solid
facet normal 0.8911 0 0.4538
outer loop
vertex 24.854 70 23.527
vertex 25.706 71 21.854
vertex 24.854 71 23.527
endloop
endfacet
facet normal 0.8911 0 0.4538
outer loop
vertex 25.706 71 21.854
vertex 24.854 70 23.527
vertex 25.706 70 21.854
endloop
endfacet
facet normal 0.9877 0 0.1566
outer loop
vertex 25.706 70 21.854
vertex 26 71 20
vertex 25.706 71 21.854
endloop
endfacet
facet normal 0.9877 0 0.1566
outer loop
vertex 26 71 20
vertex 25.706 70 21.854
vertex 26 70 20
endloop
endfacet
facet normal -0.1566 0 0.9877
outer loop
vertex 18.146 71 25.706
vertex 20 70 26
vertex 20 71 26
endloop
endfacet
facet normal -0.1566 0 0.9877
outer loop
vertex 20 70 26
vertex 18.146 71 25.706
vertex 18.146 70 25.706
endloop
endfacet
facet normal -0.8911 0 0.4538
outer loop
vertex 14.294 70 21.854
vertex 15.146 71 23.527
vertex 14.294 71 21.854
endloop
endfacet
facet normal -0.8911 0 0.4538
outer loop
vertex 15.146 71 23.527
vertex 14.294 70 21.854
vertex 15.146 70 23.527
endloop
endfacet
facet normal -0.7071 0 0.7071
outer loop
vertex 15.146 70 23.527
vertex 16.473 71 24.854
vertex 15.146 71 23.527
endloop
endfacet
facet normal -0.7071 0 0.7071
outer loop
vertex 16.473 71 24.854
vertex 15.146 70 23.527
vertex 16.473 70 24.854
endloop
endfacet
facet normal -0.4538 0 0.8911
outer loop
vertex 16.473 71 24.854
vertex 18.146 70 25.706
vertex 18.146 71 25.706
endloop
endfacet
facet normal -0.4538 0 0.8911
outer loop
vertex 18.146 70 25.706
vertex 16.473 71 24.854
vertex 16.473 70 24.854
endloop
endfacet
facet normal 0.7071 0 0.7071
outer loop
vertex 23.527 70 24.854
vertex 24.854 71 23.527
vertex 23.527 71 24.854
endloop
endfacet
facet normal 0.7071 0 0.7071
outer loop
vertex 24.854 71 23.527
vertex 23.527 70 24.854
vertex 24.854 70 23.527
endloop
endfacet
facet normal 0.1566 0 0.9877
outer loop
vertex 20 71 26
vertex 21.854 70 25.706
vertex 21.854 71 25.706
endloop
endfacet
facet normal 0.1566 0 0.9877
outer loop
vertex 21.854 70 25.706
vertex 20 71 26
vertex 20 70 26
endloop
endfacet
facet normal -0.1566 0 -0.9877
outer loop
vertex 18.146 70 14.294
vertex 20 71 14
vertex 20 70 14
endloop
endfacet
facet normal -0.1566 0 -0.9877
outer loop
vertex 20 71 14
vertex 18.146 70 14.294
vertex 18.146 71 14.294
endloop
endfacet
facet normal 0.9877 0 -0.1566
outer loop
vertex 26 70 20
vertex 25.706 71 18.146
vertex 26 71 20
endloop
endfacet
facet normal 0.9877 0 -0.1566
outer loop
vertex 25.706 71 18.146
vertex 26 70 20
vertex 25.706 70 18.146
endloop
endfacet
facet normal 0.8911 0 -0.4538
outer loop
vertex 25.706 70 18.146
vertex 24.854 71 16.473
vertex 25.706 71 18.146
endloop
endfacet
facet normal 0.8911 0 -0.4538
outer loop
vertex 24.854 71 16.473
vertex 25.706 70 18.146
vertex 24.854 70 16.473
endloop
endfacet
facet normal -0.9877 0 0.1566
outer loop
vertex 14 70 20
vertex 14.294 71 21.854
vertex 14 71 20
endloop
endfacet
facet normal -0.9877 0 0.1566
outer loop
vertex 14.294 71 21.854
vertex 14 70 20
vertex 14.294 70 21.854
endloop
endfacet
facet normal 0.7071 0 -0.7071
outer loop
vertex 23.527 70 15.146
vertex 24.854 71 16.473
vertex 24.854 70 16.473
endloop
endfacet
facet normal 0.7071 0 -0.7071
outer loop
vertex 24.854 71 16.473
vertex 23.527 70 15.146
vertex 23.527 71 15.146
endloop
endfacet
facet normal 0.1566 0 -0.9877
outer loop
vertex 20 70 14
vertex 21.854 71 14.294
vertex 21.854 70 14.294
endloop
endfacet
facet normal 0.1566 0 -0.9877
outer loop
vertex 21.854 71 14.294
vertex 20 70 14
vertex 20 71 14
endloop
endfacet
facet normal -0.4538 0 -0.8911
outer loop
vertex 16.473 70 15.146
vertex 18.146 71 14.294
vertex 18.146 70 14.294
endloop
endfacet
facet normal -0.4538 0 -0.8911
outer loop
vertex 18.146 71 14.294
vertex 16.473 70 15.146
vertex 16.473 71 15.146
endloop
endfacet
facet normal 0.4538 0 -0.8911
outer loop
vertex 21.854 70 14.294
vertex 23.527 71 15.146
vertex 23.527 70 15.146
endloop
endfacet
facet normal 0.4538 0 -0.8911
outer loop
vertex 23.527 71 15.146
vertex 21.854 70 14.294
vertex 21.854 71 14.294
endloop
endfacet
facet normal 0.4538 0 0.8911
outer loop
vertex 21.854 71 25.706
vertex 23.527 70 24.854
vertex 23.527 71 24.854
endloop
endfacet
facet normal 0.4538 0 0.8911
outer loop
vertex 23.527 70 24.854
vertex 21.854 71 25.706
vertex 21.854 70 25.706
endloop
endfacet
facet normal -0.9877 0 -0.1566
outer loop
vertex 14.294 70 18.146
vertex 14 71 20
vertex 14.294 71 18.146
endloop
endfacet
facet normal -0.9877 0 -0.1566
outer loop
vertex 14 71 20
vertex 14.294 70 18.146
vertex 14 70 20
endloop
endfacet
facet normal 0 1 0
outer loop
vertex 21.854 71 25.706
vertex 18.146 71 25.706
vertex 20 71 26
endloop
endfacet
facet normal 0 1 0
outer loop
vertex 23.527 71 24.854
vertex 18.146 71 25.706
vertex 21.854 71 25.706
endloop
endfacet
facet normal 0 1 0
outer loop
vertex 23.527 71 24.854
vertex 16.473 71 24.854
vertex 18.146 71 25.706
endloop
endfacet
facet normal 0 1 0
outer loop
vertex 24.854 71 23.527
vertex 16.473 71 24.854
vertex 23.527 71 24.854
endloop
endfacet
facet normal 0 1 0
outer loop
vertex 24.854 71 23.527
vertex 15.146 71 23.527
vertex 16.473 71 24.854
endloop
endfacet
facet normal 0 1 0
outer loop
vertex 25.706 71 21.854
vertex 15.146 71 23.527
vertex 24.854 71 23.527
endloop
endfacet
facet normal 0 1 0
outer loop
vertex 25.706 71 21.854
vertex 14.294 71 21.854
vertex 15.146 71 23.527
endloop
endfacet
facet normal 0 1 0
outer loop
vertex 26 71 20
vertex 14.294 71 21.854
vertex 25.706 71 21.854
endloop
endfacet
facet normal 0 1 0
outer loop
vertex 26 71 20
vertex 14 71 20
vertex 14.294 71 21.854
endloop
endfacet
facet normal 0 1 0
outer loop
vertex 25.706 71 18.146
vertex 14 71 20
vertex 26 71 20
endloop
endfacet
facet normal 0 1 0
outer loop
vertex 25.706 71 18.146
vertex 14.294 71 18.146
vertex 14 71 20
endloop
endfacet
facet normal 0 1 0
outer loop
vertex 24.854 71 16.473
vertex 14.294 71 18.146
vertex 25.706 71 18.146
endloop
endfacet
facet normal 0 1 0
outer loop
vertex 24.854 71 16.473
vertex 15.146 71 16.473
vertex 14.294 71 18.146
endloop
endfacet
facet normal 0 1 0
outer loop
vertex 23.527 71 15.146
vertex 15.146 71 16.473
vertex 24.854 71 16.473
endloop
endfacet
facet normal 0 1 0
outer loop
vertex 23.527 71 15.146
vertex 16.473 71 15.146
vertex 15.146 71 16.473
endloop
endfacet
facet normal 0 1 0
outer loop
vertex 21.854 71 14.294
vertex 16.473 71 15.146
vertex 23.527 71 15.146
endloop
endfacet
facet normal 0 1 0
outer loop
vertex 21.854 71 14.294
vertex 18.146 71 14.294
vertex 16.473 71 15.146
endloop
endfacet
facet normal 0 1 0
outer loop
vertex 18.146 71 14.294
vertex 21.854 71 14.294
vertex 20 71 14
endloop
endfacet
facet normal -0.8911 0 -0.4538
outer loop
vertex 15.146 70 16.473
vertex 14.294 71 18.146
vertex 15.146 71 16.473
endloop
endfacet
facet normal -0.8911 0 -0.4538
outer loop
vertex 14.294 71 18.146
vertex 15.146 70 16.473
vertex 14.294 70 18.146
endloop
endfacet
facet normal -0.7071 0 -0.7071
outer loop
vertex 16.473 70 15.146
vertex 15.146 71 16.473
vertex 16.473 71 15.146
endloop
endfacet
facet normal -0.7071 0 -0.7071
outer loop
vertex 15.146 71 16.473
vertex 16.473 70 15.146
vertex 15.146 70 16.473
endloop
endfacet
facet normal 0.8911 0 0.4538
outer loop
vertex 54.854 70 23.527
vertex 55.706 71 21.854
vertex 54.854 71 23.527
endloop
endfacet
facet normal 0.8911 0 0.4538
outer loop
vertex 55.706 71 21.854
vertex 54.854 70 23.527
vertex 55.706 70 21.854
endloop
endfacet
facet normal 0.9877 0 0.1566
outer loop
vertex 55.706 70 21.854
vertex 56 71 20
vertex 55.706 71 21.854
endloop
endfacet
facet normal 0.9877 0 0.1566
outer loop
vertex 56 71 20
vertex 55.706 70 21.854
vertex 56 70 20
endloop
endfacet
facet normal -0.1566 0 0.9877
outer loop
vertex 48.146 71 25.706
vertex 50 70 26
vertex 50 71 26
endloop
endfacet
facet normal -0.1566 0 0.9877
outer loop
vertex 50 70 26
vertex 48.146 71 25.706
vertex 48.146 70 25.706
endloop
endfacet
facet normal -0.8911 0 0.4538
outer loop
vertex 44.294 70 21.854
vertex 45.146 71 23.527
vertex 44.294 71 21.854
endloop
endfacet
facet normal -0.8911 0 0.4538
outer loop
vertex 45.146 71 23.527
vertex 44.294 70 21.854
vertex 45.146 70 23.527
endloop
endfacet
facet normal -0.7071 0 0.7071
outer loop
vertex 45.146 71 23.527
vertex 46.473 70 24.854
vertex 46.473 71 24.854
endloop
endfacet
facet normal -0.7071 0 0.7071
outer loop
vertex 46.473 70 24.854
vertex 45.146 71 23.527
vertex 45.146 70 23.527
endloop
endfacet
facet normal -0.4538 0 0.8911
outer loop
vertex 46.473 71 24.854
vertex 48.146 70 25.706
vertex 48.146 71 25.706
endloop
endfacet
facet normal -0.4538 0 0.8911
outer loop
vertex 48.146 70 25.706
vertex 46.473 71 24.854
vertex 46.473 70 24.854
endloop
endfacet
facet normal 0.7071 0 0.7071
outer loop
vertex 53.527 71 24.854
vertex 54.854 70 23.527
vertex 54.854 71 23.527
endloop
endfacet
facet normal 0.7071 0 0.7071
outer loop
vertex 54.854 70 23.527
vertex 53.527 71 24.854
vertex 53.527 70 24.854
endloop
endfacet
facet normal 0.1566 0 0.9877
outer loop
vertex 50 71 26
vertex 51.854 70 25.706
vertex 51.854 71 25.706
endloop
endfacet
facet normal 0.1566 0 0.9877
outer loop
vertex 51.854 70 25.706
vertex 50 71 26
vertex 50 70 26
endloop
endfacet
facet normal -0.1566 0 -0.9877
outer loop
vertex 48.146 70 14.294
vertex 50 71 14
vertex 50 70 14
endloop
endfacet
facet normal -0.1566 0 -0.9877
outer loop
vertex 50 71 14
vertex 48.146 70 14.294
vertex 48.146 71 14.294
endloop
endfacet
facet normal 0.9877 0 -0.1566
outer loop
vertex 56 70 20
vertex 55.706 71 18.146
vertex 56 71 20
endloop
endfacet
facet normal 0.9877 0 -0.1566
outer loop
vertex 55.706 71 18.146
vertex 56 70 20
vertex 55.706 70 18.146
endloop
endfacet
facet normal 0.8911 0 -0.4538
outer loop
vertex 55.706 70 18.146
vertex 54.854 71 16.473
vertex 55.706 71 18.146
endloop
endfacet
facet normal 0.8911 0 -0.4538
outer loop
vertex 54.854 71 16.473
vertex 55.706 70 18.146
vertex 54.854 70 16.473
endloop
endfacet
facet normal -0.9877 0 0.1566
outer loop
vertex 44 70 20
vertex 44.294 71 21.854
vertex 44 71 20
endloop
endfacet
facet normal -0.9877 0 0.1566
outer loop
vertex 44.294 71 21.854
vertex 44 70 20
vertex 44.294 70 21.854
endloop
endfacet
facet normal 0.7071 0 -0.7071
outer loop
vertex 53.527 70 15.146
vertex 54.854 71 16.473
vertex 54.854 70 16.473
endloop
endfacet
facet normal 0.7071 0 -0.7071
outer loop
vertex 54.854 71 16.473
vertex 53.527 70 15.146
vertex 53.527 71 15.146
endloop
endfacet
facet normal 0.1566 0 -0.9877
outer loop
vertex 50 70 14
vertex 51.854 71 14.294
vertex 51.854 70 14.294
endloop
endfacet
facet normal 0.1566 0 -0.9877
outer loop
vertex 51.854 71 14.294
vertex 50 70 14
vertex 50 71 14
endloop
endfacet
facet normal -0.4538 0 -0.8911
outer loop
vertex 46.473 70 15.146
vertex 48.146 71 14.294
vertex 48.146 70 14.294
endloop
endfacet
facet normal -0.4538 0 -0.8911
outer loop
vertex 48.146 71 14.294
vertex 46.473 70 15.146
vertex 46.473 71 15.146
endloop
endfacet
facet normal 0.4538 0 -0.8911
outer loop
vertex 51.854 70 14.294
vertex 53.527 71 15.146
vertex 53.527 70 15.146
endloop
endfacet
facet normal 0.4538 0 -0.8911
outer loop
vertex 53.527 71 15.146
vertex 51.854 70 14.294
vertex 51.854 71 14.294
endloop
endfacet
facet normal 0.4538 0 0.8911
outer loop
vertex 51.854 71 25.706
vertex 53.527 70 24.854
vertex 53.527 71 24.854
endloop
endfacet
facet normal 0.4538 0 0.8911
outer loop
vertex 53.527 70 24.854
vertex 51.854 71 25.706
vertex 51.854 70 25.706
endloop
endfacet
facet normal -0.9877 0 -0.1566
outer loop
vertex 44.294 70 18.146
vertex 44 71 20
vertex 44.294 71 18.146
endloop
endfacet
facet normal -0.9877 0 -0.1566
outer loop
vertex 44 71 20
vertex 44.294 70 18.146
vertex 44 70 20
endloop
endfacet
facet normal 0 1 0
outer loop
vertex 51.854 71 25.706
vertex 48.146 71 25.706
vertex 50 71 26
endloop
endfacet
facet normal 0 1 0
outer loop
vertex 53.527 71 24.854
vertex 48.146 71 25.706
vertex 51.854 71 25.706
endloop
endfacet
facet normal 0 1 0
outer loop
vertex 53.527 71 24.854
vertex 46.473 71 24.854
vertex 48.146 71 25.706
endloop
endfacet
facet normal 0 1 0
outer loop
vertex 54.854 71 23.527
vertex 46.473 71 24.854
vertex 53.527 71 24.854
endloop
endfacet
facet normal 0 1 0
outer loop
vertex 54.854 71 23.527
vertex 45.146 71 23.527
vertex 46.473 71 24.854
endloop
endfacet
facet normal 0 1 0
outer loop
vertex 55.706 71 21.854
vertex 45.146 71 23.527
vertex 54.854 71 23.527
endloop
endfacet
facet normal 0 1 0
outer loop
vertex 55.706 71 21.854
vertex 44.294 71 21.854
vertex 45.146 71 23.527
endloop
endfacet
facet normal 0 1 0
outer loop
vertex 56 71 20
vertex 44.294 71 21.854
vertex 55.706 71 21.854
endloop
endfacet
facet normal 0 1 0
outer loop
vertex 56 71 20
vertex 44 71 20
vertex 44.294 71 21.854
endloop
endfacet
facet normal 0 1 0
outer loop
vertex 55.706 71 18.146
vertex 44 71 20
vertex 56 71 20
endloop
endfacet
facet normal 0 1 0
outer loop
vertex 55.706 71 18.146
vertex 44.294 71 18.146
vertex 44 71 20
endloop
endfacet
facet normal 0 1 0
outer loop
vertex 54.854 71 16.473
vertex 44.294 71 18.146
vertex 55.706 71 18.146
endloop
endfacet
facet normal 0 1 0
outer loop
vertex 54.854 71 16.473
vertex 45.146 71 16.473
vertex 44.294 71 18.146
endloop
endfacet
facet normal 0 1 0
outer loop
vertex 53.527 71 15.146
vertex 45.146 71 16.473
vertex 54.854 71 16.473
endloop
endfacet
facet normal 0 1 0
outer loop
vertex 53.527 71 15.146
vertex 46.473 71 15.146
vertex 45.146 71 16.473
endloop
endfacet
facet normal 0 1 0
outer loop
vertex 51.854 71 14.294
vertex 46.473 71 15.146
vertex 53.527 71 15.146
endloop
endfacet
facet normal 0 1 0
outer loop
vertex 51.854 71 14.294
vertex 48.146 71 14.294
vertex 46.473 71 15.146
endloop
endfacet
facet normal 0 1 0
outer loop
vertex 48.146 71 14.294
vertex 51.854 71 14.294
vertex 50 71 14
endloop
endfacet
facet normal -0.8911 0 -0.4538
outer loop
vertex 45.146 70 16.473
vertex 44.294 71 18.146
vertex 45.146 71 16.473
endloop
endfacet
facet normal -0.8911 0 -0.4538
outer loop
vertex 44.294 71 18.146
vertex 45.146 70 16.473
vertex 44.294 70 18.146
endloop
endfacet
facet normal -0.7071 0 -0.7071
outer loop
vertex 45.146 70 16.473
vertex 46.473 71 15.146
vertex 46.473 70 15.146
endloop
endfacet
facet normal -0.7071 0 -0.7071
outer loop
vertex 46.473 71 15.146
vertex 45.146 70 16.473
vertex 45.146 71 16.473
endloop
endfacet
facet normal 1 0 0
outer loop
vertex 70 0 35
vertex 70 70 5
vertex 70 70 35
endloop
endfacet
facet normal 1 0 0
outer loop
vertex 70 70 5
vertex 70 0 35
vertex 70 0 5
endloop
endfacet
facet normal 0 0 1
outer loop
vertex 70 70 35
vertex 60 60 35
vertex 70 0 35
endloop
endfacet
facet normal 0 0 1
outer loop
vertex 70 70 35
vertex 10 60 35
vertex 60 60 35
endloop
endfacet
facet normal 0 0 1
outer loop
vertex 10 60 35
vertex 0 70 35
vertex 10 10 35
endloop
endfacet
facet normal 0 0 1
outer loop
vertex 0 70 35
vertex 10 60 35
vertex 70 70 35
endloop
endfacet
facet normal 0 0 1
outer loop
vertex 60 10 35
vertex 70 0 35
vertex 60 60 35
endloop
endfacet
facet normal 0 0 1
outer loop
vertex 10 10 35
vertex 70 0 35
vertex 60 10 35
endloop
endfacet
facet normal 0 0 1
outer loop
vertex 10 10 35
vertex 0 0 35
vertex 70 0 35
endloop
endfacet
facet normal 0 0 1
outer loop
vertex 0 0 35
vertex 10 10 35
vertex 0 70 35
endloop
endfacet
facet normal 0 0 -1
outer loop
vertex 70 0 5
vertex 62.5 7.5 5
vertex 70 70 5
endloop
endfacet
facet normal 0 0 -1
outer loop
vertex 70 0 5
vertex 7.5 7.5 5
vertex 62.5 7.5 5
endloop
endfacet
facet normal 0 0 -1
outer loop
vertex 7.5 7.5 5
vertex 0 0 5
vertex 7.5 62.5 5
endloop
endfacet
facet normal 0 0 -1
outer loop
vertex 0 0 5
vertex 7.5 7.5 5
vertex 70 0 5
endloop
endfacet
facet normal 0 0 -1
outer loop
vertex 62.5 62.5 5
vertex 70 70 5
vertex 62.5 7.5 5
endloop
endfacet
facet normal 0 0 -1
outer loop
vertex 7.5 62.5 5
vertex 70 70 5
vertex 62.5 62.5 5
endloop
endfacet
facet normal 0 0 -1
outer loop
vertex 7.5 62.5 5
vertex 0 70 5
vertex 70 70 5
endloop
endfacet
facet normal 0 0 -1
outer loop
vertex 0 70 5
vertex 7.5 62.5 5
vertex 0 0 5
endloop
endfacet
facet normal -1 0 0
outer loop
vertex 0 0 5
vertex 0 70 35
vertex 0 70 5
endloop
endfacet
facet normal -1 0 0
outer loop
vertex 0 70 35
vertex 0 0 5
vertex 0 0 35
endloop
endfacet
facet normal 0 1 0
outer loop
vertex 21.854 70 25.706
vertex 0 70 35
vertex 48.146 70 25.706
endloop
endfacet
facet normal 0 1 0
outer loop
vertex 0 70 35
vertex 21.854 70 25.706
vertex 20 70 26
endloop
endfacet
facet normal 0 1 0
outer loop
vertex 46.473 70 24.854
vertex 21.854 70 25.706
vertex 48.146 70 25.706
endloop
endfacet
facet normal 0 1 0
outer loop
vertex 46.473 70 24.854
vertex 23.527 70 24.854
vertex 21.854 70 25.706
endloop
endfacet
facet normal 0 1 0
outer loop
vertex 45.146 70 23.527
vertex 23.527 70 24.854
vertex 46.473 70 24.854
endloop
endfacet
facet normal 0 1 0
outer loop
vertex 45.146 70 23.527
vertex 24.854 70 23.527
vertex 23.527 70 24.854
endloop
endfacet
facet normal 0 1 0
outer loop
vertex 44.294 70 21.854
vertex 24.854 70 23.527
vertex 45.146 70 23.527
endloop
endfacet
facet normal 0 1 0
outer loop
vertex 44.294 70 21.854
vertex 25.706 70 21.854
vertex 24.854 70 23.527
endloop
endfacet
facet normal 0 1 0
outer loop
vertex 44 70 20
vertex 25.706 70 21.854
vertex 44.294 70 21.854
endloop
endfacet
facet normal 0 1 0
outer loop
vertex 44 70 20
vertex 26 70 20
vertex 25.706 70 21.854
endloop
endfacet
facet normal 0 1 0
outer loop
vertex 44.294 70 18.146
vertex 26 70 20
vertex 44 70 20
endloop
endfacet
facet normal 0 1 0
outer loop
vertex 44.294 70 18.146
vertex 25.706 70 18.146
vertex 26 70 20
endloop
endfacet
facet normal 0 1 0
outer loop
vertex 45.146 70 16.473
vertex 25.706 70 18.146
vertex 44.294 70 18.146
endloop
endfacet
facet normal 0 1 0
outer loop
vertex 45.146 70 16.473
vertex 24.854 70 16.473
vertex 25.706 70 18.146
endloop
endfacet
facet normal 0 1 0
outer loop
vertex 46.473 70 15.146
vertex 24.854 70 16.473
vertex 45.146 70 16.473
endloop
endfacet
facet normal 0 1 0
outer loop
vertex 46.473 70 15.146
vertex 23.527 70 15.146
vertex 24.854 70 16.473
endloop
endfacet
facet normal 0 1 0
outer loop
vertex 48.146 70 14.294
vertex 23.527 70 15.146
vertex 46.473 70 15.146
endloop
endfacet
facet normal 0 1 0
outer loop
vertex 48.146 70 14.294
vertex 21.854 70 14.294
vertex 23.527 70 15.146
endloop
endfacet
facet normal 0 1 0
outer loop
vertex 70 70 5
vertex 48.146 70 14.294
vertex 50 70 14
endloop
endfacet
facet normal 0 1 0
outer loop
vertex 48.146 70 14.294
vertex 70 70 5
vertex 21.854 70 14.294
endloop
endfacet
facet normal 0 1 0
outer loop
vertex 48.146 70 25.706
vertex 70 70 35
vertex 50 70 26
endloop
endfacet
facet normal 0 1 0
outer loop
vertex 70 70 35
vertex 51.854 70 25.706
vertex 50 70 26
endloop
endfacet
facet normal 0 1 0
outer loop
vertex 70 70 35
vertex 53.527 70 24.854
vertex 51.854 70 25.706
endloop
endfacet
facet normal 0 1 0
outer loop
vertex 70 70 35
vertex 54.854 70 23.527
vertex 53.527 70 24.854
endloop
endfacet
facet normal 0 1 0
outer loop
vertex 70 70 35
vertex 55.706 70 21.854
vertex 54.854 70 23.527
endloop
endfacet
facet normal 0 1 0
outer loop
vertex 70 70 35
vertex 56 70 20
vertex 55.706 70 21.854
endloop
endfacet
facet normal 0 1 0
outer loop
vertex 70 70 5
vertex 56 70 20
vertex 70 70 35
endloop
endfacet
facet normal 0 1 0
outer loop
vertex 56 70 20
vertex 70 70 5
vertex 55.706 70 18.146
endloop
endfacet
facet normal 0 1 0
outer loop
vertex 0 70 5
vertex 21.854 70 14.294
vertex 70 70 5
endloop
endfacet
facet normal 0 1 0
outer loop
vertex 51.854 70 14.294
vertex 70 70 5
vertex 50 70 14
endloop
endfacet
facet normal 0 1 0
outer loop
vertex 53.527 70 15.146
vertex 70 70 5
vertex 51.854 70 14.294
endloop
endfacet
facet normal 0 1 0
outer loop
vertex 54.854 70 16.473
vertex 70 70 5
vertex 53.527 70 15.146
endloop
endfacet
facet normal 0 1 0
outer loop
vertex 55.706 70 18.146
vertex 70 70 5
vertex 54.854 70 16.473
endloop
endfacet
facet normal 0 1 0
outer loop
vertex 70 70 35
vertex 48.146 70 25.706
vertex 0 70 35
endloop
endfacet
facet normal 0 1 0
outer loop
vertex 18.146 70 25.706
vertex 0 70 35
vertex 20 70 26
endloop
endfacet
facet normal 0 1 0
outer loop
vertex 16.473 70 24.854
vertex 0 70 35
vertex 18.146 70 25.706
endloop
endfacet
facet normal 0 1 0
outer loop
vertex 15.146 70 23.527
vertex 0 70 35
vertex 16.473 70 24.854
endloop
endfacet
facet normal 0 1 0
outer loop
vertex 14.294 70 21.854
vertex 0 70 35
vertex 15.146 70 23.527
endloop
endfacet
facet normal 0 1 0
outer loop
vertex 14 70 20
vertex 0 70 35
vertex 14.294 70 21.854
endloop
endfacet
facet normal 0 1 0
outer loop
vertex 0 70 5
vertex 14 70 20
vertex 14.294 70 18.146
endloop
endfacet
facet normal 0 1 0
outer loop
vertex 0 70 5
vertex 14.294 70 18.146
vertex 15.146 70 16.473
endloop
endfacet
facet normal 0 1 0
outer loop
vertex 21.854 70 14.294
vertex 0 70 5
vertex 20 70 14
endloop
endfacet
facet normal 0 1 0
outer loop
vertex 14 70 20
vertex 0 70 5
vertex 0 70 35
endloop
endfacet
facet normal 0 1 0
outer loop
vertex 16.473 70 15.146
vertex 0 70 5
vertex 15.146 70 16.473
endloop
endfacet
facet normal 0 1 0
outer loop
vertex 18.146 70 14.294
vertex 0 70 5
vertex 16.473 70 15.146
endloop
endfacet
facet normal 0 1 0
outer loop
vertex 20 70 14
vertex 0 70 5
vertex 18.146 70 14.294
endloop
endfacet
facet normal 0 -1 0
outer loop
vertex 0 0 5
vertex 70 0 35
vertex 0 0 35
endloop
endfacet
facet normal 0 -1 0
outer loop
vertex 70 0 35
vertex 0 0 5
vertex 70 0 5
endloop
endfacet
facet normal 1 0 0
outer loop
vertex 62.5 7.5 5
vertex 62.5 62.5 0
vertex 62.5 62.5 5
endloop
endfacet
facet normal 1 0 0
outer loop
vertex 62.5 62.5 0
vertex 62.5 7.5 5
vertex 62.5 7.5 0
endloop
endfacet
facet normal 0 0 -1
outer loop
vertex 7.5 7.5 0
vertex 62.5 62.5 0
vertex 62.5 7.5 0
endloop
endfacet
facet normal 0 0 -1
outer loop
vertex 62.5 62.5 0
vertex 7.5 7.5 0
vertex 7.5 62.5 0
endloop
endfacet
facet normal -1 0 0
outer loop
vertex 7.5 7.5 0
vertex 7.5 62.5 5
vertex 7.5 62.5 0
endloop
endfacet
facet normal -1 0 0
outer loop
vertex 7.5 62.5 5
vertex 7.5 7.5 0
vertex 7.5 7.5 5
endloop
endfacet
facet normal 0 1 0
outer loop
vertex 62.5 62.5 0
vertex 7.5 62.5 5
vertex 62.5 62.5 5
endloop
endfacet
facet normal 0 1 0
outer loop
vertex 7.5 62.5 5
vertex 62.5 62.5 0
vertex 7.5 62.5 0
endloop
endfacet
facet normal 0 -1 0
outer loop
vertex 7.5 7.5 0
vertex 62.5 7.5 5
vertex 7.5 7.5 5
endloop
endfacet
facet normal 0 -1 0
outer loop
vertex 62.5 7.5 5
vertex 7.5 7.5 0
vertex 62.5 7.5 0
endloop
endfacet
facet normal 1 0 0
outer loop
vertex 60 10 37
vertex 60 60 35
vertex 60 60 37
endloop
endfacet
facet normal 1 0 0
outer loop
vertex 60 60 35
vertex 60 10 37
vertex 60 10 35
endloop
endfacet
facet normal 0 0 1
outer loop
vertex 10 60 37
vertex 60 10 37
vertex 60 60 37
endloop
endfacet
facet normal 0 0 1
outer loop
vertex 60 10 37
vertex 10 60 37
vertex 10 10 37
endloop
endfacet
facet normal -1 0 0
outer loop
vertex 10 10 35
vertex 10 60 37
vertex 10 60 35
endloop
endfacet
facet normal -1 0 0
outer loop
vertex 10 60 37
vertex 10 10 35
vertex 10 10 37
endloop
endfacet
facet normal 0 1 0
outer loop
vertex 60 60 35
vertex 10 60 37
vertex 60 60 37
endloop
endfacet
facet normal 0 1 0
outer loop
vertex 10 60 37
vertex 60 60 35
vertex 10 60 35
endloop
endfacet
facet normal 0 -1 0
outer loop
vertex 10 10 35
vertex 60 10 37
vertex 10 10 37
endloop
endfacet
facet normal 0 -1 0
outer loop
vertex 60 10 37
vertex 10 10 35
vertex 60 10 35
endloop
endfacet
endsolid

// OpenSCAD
// AIO Pump/Block Model
// CPU or GPU mount block with integrated pump

module aio_pump() {
    // Block dimensions (typical AIO pump block)
    block_size = 70;
    block_height = 30;
    block_corner_radius = 10;

    // Cold plate
    plate_size = 55;
    plate_thickness = 5;

    // Tubing fittings
    fitting_radius = 6;
    fitting_height = 10;
    fitting_spacing = 30;

    union() {
        // Main pump housing (simplified rounded block)
        color("black") {
            translate([0, 0, plate_thickness]) {
                cube([block_size, block_size, block_height]);
            }
        }

        // Cold plate (contacts CPU/GPU)
        color("silver") {
            translate([(block_size - plate_size)/2, (block_size - plate_size)/2, 0]) {
                cube([plate_size, plate_size, plate_thickness]);
            }
        }

        // Tubing fittings
        color("dimgray") {
            translate([block_size/2 - fitting_spacing/2, block_size + 1, plate_thickness + block_height/2]) {
                rotate([90, 0, 0]) {
                    cylinder(h = fitting_height, r = fitting_radius, $fn = 20);
                }
            }
            translate([block_size/2 + fitting_spacing/2, block_size + 1, plate_thickness + block_height/2]) {
                rotate([90, 0, 0]) {
                    cylinder(h = fitting_height, r = fitting_radius, $fn = 20);
                }
            }
        }

        // Top logo/branding area
        color("gray") {
            translate([10, 10, plate_thickness + block_height]) {
                cube([block_size - 20, block_size - 20, 2]);
            }
        }
    }
}

// Preview
aio_pump();
